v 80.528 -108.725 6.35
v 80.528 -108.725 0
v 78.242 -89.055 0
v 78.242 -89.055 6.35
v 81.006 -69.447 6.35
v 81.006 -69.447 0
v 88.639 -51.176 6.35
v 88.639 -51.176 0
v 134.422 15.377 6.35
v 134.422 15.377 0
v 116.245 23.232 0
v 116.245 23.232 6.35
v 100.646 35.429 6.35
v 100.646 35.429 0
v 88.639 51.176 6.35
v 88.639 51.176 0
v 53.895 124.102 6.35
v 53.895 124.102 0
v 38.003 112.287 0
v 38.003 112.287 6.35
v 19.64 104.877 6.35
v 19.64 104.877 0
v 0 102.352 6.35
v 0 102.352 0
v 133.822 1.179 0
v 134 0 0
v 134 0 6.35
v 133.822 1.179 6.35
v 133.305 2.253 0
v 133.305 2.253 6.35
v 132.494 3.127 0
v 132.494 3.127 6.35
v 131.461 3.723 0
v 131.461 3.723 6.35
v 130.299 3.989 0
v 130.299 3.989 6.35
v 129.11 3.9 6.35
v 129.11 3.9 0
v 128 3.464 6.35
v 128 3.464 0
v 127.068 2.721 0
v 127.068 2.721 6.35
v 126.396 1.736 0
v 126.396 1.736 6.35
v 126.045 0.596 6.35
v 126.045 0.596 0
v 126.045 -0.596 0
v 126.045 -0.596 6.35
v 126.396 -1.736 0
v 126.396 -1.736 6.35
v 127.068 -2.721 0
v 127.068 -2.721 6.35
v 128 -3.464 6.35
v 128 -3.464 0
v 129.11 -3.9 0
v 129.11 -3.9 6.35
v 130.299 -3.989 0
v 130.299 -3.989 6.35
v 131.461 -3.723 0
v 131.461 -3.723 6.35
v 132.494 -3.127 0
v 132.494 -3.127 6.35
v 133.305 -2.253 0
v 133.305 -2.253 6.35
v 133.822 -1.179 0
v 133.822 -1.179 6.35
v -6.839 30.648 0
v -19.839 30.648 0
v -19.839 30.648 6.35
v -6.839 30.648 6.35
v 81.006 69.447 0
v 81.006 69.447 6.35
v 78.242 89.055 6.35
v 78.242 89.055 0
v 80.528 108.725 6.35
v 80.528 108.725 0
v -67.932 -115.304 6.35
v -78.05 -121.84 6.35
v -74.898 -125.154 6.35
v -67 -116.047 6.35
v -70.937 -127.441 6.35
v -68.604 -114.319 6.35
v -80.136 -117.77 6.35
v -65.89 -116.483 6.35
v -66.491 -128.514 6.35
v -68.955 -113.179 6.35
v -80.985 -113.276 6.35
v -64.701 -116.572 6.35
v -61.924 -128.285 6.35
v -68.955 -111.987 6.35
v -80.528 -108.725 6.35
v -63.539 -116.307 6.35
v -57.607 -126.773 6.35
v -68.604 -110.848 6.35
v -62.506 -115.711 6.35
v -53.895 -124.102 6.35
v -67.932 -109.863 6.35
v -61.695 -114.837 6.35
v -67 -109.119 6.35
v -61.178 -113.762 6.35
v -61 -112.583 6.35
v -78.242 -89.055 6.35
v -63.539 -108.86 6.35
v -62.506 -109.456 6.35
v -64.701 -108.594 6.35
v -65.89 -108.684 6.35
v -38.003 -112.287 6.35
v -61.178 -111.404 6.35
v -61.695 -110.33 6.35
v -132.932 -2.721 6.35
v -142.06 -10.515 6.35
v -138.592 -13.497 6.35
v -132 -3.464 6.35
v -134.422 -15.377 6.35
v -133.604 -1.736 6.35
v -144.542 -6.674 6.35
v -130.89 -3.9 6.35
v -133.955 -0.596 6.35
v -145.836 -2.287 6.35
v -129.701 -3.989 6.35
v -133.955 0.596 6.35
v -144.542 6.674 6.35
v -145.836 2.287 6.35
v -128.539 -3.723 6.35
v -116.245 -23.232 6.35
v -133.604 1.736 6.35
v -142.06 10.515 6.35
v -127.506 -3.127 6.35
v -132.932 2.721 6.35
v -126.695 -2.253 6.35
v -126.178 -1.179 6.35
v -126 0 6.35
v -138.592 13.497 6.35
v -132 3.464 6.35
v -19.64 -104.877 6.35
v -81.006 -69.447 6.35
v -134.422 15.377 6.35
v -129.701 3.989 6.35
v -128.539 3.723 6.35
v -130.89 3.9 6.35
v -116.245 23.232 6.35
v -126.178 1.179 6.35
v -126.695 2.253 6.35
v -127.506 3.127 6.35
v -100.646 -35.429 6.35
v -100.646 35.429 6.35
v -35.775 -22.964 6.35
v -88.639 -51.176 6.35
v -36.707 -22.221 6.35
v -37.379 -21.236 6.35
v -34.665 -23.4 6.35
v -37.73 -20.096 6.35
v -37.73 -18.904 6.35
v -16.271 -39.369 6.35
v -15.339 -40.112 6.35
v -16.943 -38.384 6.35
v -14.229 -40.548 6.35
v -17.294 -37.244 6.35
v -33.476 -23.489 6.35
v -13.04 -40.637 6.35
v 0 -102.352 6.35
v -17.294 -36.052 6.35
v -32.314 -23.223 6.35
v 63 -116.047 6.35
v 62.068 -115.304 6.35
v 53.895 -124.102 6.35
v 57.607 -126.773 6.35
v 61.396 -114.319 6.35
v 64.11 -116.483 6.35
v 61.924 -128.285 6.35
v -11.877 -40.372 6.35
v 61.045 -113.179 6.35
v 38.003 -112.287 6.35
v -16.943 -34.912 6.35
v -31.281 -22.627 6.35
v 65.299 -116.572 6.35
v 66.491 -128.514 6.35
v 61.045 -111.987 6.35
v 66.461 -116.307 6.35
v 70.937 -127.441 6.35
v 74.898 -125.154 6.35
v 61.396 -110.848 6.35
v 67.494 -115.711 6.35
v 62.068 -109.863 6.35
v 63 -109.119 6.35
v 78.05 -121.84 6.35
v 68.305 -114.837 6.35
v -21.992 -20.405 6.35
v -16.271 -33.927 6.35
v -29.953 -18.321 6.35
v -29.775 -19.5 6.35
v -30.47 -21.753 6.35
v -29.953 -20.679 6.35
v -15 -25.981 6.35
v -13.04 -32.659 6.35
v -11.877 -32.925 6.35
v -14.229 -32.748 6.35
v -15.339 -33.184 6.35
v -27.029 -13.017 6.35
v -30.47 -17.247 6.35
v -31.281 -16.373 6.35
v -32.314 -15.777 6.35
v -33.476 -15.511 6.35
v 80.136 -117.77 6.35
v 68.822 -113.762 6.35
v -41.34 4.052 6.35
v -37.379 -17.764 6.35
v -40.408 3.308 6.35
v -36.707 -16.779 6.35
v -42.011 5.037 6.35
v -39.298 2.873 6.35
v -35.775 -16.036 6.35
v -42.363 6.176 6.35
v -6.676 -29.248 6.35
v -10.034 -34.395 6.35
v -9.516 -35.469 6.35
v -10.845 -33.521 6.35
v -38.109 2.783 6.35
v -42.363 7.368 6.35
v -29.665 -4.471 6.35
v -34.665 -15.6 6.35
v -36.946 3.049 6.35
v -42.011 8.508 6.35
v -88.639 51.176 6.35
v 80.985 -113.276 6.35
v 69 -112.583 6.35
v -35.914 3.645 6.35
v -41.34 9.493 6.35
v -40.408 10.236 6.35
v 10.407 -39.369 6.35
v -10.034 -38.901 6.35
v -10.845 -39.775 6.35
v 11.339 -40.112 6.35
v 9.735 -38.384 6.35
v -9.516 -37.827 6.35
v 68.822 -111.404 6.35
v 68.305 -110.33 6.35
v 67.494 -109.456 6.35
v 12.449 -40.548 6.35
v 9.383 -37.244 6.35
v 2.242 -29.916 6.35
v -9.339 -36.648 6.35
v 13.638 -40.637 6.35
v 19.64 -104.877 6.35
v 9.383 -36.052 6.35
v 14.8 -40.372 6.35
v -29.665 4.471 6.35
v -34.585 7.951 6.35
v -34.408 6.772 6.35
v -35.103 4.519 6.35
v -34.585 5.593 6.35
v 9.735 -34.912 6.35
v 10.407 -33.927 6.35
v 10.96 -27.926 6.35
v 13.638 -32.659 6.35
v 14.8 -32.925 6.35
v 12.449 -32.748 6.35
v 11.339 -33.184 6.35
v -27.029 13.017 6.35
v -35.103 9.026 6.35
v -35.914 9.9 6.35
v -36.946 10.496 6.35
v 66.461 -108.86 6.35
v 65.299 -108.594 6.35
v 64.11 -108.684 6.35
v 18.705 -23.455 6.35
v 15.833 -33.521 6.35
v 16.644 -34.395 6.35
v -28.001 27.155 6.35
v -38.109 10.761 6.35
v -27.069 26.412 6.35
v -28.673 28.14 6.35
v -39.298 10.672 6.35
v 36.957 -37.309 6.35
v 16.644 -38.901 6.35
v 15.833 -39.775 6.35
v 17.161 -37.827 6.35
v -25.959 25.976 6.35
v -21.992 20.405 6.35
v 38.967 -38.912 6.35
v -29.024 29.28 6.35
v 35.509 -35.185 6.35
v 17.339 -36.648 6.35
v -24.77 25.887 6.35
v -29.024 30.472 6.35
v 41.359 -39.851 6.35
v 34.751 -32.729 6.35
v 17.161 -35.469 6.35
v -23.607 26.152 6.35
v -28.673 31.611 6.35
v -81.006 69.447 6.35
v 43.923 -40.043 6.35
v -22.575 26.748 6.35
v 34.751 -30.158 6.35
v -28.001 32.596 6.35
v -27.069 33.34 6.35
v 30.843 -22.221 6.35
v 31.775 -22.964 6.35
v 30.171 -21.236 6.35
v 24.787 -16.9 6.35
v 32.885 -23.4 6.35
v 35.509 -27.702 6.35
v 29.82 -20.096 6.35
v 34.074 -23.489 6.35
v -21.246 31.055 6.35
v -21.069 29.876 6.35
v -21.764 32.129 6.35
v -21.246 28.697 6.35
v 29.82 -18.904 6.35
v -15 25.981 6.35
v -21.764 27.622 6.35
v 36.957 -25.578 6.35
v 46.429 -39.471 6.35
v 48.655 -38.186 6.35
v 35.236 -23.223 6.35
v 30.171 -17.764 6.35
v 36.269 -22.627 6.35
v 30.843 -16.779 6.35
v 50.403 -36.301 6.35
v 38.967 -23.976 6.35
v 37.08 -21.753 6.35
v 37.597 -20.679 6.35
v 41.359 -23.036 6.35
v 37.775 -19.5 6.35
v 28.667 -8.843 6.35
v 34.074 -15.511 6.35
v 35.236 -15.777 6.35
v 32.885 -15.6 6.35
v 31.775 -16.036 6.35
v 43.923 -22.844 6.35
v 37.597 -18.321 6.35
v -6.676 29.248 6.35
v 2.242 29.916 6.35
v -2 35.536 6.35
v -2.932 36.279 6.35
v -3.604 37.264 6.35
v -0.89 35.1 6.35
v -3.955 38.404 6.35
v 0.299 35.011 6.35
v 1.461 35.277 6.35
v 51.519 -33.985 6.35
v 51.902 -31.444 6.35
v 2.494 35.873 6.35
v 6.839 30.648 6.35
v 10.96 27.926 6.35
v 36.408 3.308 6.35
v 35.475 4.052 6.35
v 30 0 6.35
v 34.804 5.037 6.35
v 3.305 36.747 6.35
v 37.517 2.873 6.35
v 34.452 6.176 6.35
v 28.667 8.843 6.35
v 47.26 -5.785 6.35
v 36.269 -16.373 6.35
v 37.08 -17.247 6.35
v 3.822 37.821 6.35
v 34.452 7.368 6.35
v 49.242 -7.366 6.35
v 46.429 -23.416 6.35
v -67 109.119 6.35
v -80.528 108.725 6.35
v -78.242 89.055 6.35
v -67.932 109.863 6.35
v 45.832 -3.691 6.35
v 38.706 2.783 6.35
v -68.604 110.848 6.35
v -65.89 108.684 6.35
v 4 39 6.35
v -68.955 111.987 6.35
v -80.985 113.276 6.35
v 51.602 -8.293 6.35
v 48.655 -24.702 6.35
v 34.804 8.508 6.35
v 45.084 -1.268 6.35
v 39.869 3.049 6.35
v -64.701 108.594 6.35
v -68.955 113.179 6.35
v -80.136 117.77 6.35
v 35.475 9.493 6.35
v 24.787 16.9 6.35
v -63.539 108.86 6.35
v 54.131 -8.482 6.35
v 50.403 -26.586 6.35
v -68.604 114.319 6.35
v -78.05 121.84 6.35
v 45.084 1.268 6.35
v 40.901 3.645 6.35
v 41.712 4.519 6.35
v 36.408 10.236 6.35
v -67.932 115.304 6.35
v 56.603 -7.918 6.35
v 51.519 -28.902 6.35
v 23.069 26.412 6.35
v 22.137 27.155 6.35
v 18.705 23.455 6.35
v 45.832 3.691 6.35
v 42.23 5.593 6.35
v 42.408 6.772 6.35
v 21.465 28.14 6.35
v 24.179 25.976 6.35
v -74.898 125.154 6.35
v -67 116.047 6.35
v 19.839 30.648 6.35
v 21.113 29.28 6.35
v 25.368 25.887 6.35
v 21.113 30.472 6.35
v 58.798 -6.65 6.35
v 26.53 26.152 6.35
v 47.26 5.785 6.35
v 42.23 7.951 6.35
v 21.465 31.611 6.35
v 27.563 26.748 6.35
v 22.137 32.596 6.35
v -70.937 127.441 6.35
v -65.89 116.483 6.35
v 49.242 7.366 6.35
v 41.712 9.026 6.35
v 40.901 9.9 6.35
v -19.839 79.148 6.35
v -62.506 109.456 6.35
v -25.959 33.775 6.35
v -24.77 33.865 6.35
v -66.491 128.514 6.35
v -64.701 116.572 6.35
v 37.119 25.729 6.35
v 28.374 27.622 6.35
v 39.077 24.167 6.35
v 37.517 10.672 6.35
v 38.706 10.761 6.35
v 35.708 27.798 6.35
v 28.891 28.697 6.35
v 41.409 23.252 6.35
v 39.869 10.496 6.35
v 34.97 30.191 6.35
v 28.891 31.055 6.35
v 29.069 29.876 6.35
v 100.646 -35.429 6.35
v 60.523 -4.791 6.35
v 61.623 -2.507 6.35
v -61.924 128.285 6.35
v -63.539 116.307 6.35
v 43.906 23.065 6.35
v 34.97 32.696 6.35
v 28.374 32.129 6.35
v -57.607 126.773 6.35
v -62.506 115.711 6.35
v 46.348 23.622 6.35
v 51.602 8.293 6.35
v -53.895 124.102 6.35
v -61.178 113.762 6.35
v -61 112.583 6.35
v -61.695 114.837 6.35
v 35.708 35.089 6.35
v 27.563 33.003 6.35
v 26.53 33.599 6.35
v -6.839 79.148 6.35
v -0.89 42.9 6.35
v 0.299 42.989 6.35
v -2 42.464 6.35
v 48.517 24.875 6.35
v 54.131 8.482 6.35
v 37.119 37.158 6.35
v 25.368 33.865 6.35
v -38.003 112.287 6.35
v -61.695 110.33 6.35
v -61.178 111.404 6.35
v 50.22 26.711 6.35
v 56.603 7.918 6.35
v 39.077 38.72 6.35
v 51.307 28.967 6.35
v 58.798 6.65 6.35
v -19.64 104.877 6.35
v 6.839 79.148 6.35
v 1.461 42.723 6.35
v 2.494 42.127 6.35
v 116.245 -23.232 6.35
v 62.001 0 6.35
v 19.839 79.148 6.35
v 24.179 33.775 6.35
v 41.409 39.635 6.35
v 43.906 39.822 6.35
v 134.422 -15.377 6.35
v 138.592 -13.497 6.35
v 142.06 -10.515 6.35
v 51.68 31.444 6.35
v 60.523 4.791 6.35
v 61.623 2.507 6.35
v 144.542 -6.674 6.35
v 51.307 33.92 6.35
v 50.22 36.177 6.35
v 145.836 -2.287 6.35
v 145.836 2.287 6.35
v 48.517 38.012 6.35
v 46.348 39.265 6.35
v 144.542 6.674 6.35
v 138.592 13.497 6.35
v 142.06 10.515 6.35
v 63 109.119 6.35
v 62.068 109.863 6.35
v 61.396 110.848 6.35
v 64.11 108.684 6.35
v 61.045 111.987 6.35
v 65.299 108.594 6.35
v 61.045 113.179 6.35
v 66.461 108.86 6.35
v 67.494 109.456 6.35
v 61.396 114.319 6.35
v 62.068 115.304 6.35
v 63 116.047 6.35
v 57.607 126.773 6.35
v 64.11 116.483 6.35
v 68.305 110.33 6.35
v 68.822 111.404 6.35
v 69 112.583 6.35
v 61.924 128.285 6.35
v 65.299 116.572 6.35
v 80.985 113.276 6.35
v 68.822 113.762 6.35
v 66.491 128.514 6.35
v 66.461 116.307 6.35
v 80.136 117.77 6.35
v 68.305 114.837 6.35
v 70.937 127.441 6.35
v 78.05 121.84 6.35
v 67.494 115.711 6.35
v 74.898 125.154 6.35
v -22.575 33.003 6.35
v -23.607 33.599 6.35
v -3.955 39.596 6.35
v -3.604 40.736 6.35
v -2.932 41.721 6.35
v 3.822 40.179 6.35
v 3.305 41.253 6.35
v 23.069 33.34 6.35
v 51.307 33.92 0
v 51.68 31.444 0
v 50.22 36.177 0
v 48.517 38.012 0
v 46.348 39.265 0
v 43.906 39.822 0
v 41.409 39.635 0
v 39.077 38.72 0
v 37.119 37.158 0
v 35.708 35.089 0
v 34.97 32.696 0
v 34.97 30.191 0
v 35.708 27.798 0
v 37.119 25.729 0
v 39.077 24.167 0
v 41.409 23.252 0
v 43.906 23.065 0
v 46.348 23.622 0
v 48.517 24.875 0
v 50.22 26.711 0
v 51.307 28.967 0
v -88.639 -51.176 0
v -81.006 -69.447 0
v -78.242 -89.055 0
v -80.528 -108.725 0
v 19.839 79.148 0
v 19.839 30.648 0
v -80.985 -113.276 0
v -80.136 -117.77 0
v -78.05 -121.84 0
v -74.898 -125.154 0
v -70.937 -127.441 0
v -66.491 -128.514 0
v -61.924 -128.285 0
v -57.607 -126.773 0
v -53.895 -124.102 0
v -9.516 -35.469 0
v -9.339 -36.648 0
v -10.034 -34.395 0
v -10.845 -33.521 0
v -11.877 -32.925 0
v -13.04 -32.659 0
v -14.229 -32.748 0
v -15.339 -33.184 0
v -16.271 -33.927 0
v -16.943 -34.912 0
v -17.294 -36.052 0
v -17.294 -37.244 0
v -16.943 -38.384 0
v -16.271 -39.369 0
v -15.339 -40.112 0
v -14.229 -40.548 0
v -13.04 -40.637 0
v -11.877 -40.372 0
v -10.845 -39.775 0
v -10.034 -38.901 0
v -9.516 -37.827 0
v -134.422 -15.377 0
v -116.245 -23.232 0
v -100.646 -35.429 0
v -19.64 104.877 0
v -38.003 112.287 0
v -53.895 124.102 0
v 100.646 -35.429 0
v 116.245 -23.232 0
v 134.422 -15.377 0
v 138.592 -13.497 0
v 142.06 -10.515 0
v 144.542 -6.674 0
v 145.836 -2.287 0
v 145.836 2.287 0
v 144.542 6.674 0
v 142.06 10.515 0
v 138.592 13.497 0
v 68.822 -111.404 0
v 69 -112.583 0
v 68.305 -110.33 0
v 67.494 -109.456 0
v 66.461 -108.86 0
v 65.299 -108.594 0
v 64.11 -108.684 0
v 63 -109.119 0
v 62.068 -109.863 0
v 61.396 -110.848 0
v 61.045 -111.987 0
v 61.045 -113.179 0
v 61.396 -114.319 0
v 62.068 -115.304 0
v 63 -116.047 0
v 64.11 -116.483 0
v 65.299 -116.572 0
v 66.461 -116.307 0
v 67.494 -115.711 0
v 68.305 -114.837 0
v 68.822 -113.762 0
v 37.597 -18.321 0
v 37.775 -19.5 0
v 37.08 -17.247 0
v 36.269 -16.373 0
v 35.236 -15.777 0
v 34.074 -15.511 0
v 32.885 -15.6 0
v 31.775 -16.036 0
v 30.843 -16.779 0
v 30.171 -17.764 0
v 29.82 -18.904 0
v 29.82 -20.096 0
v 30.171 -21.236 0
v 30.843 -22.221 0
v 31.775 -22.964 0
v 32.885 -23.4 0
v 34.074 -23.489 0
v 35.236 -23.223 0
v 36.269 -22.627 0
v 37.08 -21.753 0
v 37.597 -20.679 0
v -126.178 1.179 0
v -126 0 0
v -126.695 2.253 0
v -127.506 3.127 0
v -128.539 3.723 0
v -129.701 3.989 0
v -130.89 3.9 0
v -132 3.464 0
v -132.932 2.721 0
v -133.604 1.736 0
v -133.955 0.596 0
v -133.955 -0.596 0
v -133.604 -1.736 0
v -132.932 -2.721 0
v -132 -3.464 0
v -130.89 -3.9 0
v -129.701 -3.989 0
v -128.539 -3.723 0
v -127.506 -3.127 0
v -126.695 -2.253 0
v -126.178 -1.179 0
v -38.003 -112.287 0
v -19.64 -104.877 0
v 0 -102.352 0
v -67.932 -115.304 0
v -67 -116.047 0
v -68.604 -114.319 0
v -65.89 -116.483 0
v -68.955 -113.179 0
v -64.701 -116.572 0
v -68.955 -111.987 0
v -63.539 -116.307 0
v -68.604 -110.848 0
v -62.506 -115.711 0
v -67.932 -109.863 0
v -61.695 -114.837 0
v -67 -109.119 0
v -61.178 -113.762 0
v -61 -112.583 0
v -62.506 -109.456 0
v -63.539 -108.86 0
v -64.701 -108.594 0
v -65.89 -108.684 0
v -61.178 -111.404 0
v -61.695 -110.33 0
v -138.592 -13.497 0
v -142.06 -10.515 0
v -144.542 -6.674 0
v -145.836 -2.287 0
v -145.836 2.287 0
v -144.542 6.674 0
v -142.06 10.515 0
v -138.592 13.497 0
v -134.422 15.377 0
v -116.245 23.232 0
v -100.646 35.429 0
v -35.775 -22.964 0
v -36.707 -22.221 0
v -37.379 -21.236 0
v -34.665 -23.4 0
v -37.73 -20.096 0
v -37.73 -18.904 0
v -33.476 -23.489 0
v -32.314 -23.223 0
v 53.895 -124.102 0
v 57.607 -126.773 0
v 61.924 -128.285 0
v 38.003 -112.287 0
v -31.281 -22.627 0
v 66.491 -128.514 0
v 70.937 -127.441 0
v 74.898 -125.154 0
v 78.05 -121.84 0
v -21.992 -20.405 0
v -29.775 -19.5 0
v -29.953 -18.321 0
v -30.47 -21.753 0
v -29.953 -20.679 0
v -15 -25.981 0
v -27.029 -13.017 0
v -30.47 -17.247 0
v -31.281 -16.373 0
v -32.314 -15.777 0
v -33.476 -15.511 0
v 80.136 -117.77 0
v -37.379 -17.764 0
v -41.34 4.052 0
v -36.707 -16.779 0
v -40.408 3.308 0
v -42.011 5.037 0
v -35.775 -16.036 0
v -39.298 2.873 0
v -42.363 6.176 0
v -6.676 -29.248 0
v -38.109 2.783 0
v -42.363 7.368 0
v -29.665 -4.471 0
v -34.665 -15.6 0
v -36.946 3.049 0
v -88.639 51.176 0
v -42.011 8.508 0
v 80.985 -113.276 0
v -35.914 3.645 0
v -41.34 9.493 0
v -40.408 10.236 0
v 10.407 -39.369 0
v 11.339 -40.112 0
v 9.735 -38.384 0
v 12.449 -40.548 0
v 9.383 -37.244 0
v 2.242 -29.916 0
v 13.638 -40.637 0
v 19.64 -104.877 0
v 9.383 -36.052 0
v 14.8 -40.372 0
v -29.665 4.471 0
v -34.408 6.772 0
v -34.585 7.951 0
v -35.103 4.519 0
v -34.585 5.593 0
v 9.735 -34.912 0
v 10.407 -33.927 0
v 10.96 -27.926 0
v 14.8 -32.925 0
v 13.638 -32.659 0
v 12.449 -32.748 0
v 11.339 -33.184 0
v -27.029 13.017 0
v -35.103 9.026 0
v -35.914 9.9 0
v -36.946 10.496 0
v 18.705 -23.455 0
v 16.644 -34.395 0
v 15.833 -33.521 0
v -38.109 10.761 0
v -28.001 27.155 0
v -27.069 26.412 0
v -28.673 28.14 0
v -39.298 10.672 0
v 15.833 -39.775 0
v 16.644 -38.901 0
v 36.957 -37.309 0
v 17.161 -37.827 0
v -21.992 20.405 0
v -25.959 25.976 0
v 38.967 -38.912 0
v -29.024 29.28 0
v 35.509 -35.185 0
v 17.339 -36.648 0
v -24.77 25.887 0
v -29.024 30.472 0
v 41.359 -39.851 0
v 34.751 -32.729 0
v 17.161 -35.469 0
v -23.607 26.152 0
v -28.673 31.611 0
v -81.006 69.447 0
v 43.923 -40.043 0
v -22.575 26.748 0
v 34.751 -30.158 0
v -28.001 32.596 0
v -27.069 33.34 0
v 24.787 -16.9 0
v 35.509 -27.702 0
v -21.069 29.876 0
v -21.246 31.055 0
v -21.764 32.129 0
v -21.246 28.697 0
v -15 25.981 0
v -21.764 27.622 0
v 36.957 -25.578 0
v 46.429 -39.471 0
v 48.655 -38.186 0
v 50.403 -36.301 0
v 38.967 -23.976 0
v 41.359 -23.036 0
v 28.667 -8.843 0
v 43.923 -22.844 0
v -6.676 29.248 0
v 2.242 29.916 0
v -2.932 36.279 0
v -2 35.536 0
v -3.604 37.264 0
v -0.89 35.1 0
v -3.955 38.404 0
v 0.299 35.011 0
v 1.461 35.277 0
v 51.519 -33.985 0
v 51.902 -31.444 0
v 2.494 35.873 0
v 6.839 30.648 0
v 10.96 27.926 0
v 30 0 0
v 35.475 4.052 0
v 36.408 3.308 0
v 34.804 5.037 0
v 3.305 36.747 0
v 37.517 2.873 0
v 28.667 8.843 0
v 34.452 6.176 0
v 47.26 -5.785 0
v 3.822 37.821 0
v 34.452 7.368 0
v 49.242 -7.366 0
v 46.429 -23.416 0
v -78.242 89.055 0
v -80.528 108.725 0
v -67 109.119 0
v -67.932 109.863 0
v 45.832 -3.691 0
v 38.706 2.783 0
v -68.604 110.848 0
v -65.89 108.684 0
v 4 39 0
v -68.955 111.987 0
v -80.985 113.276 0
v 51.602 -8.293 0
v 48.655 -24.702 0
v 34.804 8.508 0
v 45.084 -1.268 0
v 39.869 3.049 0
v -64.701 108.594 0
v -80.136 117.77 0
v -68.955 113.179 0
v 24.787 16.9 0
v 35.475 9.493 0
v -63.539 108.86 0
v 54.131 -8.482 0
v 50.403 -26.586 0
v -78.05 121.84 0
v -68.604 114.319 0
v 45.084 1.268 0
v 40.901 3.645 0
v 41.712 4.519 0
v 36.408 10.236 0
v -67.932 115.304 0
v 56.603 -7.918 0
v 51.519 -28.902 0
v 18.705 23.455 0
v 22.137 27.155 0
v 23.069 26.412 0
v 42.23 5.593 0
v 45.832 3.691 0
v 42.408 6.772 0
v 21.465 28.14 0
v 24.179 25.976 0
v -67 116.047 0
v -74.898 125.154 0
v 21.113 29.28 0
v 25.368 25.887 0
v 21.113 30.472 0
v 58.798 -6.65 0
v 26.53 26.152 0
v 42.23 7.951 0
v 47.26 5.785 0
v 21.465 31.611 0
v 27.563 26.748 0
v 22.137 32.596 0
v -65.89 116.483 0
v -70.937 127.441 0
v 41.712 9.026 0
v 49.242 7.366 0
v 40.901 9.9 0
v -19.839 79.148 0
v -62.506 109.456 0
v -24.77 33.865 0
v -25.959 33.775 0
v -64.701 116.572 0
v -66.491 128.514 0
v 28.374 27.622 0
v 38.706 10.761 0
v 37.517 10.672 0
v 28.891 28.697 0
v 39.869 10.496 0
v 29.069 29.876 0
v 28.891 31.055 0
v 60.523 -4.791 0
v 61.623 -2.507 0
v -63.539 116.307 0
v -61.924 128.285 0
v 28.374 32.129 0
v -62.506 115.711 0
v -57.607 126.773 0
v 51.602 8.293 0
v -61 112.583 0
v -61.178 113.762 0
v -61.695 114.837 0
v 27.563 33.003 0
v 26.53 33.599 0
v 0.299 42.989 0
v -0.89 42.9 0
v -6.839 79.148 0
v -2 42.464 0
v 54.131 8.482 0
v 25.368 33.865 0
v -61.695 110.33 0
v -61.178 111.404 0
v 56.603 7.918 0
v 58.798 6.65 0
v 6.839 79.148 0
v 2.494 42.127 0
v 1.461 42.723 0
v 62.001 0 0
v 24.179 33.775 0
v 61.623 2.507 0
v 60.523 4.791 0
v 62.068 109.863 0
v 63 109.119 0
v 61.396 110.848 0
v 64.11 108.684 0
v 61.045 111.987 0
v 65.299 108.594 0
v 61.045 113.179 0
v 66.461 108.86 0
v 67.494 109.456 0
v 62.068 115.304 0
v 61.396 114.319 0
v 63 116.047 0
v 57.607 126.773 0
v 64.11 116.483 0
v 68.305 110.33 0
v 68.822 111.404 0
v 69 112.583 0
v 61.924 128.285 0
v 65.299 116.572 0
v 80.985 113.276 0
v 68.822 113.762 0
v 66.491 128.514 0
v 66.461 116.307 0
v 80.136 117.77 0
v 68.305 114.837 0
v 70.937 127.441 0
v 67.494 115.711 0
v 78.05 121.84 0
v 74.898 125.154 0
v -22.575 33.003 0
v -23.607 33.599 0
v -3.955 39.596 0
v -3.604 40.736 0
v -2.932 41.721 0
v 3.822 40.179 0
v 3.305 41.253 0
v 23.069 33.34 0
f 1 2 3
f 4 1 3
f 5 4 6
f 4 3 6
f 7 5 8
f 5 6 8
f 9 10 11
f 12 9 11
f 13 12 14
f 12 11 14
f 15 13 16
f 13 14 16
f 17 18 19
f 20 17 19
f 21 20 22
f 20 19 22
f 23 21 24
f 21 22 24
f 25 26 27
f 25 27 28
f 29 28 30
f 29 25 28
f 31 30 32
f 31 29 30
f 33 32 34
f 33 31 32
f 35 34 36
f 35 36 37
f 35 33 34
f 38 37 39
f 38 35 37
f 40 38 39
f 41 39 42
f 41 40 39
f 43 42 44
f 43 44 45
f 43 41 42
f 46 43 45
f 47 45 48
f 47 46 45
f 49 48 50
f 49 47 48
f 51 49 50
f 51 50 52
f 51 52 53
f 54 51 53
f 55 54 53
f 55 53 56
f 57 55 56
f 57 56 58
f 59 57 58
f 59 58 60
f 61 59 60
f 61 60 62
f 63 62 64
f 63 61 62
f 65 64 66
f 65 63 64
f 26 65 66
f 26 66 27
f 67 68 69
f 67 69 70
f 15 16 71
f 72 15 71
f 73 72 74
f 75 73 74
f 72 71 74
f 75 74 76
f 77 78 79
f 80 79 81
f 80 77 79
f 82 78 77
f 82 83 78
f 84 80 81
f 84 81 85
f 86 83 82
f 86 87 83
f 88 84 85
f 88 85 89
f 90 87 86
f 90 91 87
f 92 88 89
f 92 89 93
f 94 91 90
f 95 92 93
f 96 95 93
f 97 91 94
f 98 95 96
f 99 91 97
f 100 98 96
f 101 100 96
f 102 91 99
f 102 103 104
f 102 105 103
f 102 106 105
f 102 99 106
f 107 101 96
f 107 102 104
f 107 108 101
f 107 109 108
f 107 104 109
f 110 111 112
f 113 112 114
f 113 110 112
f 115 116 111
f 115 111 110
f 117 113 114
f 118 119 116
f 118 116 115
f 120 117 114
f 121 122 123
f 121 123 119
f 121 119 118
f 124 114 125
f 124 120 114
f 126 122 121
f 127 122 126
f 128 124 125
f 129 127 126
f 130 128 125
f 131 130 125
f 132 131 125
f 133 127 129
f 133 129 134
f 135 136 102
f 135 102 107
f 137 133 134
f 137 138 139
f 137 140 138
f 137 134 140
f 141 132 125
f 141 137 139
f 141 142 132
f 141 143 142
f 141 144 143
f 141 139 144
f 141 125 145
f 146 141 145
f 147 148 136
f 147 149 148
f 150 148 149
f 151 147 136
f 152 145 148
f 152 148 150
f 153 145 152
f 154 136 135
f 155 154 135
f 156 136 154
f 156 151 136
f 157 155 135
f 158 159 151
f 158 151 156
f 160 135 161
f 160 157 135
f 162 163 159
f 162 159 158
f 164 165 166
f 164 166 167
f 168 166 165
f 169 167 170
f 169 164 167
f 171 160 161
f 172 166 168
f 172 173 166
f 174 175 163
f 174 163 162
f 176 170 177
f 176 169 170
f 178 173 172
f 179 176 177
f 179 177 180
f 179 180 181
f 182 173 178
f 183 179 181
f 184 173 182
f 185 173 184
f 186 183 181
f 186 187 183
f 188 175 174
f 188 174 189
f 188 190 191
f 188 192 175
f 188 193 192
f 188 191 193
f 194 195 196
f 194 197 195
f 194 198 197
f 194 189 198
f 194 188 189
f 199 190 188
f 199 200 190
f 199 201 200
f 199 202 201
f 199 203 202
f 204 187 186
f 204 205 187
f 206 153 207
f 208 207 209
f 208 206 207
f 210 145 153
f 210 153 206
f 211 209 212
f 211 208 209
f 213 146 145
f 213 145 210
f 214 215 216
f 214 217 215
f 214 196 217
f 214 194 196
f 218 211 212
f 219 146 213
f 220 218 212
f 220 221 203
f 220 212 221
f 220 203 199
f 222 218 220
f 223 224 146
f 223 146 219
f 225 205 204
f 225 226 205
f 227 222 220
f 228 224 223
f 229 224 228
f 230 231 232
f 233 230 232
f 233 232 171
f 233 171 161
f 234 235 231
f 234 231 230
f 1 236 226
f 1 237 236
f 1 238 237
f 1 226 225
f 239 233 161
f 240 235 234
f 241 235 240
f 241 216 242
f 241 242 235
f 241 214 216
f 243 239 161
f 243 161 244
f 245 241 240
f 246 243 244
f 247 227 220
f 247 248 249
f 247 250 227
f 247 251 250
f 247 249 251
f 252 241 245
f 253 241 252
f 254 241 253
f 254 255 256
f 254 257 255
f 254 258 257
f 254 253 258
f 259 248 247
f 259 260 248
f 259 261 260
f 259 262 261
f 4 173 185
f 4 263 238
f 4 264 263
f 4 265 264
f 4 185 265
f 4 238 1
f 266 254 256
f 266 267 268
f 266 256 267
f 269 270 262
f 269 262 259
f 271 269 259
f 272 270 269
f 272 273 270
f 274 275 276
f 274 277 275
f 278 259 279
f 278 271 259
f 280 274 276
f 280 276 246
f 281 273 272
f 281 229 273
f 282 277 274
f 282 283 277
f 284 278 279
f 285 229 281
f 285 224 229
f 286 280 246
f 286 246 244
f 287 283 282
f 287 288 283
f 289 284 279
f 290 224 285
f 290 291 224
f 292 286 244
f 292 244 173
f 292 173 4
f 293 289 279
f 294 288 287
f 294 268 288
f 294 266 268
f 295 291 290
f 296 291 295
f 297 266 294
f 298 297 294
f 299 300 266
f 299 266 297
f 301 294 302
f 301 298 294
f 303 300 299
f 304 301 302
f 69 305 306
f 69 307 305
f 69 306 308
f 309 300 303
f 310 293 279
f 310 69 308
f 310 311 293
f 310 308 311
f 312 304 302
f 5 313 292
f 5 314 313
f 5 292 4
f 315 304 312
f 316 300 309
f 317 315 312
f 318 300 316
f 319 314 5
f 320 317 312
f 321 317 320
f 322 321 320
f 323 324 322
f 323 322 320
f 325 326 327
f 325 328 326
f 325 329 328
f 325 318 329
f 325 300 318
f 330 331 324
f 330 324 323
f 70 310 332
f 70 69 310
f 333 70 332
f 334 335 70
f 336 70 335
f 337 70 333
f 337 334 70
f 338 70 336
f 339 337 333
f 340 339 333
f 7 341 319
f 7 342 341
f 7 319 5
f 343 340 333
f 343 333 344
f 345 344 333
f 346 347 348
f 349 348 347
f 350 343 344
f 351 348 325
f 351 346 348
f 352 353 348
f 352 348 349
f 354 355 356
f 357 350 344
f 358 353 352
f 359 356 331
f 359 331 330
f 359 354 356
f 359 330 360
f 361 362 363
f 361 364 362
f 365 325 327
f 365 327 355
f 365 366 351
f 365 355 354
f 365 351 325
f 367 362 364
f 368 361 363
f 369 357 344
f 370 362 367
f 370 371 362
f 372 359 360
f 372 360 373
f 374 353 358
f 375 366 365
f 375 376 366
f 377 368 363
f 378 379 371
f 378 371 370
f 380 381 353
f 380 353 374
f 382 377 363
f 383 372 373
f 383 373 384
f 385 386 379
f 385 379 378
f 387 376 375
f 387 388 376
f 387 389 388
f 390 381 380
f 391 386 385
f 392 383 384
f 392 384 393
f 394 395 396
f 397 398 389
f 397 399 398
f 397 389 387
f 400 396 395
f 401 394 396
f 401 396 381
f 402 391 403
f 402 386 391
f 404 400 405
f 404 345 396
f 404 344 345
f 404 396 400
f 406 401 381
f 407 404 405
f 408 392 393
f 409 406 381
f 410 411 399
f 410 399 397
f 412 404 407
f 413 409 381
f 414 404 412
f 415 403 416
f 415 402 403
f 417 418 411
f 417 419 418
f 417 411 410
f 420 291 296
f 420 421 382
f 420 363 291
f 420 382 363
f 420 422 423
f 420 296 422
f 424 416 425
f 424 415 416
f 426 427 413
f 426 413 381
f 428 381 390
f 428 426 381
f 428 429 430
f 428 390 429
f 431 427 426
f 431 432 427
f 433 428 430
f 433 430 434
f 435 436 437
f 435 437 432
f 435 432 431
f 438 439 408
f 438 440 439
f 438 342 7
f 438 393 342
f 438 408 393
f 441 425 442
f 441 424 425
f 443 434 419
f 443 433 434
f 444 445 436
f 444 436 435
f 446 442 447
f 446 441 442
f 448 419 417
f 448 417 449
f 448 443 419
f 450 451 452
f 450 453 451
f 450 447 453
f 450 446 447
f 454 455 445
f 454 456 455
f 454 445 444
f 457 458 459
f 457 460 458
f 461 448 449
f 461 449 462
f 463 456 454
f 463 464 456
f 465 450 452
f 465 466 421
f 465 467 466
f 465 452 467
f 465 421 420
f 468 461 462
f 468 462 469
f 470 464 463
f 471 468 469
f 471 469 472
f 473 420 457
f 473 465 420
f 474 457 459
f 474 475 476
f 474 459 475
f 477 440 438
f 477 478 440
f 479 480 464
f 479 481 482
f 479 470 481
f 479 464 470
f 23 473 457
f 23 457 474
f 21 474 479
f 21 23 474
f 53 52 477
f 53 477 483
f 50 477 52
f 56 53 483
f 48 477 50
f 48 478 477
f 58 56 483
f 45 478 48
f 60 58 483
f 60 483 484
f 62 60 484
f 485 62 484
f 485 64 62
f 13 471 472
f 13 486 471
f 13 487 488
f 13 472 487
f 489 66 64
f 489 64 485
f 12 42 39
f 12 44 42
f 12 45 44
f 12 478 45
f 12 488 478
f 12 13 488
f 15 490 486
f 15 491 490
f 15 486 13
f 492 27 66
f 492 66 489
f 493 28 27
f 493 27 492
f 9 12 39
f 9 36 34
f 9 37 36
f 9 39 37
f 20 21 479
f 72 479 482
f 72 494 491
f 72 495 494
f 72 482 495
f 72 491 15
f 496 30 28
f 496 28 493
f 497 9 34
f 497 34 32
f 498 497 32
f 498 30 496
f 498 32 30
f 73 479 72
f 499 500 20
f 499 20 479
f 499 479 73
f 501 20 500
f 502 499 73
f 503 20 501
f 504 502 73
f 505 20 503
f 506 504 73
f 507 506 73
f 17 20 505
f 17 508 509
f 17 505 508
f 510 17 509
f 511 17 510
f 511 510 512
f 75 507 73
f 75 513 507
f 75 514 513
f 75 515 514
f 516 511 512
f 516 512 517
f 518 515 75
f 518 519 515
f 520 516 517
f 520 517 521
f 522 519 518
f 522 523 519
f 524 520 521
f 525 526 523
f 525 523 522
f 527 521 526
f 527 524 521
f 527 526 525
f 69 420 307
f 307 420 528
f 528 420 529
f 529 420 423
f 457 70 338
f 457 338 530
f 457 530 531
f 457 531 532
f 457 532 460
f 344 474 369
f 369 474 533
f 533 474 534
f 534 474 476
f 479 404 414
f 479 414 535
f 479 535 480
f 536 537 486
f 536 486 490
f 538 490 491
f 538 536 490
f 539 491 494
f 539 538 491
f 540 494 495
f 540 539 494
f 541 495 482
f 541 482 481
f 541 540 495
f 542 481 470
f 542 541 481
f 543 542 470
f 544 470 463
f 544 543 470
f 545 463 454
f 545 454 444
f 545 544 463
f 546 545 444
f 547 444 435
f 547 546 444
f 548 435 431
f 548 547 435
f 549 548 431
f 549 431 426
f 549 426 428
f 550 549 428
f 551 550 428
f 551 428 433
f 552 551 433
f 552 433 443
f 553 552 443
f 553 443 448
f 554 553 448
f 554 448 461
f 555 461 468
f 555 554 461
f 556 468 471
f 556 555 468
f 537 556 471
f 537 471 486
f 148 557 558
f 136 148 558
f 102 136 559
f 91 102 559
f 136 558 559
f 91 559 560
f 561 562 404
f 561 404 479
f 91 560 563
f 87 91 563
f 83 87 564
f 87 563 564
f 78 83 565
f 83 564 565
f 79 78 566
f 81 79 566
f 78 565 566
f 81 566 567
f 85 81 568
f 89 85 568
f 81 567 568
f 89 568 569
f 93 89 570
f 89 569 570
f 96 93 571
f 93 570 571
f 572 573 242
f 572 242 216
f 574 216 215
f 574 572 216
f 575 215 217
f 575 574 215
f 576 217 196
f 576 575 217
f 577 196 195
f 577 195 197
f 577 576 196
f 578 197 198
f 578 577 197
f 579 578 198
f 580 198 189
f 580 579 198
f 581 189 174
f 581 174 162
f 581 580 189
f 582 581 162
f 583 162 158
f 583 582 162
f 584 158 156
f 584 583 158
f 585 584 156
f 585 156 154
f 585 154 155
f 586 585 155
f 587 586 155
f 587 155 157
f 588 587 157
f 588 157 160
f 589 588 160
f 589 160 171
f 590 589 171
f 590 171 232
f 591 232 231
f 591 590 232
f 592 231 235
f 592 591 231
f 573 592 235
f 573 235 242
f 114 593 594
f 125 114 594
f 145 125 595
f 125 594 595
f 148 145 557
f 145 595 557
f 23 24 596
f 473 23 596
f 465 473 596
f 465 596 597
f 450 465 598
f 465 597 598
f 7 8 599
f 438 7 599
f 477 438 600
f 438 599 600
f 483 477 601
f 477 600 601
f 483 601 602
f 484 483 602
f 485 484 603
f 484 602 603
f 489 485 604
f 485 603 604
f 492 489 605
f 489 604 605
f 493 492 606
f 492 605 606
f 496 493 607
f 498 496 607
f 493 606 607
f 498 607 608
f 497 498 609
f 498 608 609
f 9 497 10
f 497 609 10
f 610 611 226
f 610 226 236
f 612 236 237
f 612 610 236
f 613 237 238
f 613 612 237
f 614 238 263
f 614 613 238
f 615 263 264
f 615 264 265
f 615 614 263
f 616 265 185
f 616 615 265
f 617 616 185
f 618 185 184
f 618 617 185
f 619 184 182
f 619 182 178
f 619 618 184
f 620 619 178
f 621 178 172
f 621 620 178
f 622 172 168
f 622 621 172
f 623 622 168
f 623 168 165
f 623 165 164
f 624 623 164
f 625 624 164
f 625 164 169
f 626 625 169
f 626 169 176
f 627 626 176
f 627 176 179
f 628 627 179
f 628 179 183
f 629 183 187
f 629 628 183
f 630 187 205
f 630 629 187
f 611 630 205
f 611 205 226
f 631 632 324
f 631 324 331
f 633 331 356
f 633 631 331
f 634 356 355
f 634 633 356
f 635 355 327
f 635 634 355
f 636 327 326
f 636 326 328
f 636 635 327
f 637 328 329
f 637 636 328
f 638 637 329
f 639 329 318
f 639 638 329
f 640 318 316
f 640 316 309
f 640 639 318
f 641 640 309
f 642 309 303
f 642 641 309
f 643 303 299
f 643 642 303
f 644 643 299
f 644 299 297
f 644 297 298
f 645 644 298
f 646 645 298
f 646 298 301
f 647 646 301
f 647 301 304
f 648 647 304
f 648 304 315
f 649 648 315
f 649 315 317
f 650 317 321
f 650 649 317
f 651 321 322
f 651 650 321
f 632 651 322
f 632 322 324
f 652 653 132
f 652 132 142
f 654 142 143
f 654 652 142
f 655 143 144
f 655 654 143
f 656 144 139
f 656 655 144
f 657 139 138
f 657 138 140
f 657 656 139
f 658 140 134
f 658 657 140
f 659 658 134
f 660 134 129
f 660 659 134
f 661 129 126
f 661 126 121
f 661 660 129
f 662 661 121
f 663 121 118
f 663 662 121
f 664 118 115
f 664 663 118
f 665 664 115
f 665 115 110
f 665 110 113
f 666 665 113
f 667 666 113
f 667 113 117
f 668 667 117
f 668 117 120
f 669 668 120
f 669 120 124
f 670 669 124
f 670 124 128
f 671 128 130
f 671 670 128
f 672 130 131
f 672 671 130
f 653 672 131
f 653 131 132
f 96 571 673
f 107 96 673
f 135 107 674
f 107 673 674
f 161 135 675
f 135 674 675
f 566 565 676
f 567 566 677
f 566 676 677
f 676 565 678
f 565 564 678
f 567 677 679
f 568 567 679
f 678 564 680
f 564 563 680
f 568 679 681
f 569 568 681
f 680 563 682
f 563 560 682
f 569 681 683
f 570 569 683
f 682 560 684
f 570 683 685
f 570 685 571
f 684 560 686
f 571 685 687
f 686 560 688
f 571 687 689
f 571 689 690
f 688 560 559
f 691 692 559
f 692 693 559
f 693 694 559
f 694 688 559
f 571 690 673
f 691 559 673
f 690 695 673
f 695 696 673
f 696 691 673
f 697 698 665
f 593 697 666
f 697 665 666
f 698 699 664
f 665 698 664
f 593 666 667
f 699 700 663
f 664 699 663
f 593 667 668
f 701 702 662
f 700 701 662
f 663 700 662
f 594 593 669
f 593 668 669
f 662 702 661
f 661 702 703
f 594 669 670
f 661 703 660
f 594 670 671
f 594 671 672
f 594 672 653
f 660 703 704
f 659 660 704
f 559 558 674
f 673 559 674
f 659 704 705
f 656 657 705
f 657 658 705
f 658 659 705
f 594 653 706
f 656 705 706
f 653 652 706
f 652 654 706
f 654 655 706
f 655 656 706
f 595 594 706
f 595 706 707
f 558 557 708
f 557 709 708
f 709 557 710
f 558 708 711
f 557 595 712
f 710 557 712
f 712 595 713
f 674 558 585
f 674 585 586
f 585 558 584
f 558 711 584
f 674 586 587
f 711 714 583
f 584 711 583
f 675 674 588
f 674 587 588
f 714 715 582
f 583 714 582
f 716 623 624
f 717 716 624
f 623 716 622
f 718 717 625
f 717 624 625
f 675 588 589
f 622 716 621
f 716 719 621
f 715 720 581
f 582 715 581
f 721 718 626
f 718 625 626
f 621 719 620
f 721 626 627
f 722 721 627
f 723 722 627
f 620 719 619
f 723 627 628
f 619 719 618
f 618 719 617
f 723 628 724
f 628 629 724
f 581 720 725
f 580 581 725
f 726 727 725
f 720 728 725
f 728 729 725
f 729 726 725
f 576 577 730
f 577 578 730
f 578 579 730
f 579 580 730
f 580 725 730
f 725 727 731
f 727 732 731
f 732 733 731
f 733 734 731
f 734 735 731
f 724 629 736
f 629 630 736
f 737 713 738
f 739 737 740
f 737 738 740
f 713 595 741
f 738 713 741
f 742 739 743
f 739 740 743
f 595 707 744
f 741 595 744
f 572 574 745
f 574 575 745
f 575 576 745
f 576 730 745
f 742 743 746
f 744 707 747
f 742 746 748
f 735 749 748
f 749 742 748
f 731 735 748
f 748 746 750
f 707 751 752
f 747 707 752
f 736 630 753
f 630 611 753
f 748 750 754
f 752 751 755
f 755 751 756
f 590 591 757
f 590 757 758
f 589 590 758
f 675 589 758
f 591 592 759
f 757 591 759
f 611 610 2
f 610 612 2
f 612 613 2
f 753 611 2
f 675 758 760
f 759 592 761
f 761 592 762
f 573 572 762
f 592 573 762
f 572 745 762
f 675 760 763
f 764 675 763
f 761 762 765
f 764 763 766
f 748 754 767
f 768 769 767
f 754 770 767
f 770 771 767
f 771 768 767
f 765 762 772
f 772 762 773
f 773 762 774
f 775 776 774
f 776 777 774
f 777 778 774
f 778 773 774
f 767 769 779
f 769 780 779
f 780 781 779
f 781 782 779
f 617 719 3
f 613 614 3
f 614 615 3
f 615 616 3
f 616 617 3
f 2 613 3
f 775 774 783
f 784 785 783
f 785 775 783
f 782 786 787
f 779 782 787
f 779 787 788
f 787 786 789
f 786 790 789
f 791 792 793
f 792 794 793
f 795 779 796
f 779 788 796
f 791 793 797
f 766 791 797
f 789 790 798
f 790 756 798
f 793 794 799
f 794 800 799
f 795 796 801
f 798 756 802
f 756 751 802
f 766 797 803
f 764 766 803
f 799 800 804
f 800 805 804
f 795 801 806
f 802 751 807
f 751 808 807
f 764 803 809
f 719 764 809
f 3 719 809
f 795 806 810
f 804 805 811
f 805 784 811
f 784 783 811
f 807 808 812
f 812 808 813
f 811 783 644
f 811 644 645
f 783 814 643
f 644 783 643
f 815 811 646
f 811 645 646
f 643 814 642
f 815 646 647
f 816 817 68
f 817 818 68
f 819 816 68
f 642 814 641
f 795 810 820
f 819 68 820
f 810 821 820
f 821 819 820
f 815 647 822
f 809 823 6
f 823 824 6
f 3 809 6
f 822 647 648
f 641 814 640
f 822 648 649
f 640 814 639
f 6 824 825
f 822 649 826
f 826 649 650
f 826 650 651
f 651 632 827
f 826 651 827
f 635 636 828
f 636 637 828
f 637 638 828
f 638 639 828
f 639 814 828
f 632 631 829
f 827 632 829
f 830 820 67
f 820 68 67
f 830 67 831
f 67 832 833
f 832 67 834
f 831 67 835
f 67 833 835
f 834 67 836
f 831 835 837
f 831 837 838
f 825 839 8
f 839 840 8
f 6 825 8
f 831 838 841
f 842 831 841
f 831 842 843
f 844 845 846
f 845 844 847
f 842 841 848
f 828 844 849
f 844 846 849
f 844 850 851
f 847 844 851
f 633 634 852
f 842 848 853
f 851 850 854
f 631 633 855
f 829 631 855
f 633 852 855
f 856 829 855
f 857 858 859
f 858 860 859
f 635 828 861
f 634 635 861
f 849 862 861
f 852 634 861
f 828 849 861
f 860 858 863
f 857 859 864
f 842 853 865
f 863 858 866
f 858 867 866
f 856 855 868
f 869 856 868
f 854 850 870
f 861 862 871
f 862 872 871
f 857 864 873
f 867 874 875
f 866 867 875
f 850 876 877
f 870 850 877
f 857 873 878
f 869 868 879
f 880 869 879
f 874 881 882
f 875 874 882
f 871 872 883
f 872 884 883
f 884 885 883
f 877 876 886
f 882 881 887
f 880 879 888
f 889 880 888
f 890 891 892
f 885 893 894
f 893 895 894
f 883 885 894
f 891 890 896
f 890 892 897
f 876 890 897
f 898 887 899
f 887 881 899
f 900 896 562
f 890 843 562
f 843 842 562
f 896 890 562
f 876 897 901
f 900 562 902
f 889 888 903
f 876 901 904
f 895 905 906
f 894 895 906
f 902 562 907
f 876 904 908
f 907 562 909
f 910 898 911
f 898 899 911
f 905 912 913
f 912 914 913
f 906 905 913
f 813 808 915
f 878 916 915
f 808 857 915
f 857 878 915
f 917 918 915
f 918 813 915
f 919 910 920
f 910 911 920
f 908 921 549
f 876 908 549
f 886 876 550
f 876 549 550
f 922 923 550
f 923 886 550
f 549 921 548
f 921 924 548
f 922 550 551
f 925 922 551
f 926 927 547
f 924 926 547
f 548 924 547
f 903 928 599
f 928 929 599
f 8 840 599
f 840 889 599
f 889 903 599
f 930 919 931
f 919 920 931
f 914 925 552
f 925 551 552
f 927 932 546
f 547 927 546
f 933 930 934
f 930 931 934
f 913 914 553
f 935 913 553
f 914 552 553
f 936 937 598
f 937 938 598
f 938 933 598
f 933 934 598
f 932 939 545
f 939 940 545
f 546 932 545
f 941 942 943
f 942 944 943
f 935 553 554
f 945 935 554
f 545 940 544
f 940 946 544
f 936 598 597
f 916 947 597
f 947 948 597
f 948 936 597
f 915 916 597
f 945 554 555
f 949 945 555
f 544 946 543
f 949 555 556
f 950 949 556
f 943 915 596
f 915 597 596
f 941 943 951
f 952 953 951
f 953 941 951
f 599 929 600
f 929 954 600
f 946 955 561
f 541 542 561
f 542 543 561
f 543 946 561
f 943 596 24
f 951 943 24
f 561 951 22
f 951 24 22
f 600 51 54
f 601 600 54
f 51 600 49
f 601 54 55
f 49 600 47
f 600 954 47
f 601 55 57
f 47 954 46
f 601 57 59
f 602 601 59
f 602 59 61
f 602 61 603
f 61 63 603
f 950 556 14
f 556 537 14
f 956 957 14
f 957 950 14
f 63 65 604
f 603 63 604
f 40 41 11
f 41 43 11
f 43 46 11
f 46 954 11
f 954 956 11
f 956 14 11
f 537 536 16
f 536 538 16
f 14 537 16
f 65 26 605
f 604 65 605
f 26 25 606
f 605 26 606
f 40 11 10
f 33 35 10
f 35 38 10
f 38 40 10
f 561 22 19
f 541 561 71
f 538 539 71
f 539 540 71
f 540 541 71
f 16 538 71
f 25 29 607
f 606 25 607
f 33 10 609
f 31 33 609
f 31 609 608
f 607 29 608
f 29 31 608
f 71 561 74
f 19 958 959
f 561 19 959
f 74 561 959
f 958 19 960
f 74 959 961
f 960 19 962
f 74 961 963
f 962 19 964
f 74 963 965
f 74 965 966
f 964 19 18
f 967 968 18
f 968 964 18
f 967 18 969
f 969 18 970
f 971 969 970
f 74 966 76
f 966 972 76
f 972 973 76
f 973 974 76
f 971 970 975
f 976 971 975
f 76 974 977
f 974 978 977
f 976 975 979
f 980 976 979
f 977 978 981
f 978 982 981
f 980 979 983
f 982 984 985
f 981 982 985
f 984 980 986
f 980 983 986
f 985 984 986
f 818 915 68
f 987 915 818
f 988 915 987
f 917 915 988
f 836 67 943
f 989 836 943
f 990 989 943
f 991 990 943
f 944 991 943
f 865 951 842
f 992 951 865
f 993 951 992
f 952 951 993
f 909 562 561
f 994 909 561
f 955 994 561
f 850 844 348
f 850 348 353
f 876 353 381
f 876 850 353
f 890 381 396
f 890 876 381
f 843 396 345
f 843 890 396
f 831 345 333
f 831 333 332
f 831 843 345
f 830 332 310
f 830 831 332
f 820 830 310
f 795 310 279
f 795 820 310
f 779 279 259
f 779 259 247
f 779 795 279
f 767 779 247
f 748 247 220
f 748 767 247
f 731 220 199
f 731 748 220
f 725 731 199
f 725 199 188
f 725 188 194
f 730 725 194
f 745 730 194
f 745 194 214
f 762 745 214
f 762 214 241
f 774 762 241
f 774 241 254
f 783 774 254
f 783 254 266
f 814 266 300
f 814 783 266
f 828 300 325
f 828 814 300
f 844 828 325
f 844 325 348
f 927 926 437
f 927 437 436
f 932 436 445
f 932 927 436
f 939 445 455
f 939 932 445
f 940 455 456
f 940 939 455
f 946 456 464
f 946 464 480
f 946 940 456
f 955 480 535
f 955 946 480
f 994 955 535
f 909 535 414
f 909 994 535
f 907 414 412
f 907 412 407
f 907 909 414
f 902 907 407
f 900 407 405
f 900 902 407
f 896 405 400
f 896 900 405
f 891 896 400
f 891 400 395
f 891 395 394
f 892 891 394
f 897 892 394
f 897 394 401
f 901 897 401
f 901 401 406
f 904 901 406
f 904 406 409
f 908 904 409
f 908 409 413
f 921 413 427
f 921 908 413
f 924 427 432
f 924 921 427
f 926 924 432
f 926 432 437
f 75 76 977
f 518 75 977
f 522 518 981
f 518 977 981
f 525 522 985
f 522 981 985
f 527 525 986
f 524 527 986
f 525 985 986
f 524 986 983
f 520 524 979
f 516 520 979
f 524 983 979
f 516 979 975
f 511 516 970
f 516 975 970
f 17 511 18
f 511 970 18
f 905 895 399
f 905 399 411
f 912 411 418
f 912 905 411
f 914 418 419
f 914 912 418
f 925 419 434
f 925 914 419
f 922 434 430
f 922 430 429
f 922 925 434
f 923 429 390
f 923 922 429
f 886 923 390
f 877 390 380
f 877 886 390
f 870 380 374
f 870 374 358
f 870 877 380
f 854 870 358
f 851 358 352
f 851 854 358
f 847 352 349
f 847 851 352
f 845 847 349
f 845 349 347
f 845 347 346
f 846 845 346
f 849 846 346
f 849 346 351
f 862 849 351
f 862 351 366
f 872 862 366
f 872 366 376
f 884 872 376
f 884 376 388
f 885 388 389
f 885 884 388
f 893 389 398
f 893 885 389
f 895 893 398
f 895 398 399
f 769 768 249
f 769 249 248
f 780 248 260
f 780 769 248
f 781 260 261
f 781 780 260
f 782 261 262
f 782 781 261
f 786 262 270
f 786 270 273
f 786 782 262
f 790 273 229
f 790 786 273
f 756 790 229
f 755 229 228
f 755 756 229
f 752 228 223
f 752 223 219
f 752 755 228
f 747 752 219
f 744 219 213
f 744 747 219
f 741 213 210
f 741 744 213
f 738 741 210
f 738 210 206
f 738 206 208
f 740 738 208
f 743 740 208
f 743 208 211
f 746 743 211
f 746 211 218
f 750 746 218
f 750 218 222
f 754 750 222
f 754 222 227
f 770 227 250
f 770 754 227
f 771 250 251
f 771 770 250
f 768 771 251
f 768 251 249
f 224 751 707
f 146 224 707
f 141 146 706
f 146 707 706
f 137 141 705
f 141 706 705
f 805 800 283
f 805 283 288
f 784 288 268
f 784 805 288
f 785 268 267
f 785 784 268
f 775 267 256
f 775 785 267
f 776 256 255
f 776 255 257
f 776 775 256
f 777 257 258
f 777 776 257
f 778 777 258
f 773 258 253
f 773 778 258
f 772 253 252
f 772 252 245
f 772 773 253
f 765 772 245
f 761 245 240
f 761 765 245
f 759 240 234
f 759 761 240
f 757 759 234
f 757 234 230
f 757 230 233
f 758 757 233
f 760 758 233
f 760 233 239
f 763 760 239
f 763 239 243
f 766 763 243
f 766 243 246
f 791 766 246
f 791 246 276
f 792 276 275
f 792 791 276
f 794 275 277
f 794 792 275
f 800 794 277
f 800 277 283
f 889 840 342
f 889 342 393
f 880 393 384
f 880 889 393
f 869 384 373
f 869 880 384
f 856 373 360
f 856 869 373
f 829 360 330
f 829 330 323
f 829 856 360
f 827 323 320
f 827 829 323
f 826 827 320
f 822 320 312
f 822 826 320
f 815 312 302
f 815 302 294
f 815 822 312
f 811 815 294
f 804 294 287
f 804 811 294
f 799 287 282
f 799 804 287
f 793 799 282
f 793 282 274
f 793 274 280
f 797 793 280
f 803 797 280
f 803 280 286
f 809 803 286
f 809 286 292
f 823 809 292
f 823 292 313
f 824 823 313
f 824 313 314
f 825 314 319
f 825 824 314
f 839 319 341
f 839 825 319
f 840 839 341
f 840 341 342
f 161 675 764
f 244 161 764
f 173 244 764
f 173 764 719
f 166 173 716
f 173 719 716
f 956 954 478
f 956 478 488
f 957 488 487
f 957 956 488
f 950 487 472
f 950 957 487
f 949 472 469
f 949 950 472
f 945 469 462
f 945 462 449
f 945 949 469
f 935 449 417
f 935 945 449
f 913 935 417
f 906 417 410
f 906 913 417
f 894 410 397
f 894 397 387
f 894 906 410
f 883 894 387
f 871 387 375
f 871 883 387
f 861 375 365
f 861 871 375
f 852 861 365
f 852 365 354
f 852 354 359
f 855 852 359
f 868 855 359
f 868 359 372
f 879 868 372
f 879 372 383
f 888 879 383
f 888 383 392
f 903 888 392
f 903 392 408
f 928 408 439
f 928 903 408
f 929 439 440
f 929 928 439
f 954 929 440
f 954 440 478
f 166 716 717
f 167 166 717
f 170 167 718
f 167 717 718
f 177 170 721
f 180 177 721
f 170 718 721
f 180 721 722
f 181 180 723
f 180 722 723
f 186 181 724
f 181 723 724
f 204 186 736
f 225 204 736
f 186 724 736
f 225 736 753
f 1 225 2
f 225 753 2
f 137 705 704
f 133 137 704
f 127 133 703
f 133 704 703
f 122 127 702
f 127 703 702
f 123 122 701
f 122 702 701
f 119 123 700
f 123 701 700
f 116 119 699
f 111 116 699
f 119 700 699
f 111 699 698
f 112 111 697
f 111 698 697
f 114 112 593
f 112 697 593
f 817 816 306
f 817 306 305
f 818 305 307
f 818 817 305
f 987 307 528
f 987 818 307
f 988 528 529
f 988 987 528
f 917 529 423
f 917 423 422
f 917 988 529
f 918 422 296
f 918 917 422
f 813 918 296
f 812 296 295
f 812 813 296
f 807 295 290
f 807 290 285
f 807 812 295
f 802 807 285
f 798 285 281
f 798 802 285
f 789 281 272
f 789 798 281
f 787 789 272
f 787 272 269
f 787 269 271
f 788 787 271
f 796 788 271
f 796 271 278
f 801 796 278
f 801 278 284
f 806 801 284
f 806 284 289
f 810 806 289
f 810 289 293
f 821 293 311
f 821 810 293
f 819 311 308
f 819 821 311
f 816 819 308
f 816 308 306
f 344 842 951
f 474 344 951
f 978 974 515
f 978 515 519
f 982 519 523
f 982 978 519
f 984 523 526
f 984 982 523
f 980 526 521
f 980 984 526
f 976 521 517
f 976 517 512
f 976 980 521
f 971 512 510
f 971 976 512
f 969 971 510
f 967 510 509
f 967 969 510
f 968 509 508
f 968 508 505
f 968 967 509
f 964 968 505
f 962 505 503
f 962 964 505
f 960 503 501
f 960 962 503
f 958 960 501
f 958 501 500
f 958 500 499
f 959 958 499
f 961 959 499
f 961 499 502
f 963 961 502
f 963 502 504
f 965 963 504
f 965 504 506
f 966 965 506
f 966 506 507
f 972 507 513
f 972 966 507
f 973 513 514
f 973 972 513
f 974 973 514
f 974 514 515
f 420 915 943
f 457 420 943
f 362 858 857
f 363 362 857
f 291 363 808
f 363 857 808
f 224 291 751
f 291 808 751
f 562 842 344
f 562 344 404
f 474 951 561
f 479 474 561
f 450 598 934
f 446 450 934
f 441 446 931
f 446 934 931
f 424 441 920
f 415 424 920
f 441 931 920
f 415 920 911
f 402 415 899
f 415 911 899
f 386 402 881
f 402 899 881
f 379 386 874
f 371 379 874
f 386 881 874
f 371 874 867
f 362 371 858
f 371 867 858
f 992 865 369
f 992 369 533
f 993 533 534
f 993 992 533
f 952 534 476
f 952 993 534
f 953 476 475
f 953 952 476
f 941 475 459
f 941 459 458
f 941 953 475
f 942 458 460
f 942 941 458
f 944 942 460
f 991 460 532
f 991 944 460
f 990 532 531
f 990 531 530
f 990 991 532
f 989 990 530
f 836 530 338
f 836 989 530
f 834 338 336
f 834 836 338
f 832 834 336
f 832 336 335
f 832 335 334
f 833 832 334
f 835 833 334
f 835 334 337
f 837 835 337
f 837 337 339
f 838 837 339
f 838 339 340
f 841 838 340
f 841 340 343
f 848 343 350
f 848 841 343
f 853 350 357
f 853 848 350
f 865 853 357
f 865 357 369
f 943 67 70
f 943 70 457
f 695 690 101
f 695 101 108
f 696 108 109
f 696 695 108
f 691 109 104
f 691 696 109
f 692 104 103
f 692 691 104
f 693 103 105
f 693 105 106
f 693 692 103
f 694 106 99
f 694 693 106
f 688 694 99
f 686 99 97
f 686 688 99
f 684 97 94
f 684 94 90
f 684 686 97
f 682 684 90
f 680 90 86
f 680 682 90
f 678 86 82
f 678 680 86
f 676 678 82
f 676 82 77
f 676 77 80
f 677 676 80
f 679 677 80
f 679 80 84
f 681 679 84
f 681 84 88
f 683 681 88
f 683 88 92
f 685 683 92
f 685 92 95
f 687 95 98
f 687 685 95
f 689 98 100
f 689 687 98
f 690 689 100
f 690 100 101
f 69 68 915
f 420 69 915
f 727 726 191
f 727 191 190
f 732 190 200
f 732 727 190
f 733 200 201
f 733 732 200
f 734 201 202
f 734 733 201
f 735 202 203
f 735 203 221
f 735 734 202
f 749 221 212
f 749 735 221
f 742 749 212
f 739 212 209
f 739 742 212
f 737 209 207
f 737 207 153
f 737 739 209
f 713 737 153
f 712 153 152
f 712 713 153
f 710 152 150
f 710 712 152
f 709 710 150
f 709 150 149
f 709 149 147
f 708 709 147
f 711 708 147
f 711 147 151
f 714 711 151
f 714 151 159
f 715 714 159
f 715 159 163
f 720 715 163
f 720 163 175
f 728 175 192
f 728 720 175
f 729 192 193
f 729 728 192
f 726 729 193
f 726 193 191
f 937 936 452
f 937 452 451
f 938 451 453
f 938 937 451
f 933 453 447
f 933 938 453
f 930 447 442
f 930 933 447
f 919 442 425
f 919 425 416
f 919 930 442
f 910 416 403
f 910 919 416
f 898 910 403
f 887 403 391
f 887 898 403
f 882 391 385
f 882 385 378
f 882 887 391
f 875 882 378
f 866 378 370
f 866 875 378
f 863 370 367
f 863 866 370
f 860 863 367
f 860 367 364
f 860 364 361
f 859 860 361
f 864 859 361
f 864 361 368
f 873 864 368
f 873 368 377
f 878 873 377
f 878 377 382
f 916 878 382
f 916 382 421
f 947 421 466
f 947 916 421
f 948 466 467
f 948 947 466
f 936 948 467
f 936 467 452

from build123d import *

# Parameters (mm, degrees)
SKETCH2_R           = 4
SKETCH2_R_2         = 30
SKETCH2_R_3         = 8.623329564
SKETCH2_R_4         = 8.505813098
SKETCH2_R_5         = 8.401963559
SKETCH2_W           = 13
SKETCH2_H           = 48.5
BOSS_EXTRUDE1_DEPTH = 6.35


with BuildPart() as part:
    # Sketch2 → Boss-Extrude1 (new body)
    with BuildSketch(Plane.XY):
        with BuildLine():
            ThreePointArc((80.527805435, 108.72490148), (73, 126.439708953), (53.894623988, 124.101575958))
            ThreePointArc((53.894623988, 124.101575958), (29.058945383, 107.994153026), (0, 102.351662573))
            ThreePointArc((0, 102.351662573), (-29.058945383, 107.994153026), (-53.894623988, 124.101575958))
            ThreePointArc((-53.894623988, 124.101575958), (-73, 126.439708953), (-80.527805435, 108.72490148))
            ThreePointArc((-80.527805435, 108.72490148), (-78.996207289, 79.162861422), (-88.639139908, 51.175831286))
            ThreePointArc((-88.639139908, 51.175831286), (-108.055152672, 28.831291604), (-134.422429423, 15.376674478))
            ThreePointArc((-134.422429423, 15.376674478), (-146, 0), (-134.422429423, -15.376674478))
            ThreePointArc((-134.422429423, -15.376674478), (-108.055152672, -28.831291604), (-88.639139908, -51.175831286))
            ThreePointArc((-88.639139908, -51.175831286), (-78.996207289, -79.162861422), (-80.527805435, -108.72490148))
            ThreePointArc((-80.527805435, -108.72490148), (-73, -126.439708953), (-53.894623988, -124.101575958))
            ThreePointArc((-53.894623988, -124.101575958), (-29.058945383, -107.994153026), (0, -102.351662573))
            ThreePointArc((0, -102.351662573), (29.058945383, -107.994153026), (53.894623988, -124.101575958))
            ThreePointArc((53.894623988, -124.101575958), (73, -126.439708953), (80.527805435, -108.72490148))
            ThreePointArc((80.527805435, -108.72490148), (78.996207289, -79.162861422), (88.639139908, -51.175831286))
            ThreePointArc((88.639139908, -51.175831286), (108.055152672, -28.831291604), (134.422429423, -15.376674478))
            ThreePointArc((134.422429423, -15.376674478), (146, 0), (134.422429423, 15.376674478))
            ThreePointArc((134.422429423, 15.376674478), (108.055152672, 28.831291604), (88.639139908, 51.175831286))
            ThreePointArc((88.639139908, 51.175831286), (78.996207289, 79.162861422), (80.527805435, 108.72490148))
        make_face()
        with Locations((65, 112.583302492)):
            Circle(SKETCH2_R, mode=Mode.SUBTRACT)
        with Locations((130, 0)):
            Circle(SKETCH2_R, mode=Mode.SUBTRACT)
        with Locations((65, -112.583302492)):
            Circle(SKETCH2_R, mode=Mode.SUBTRACT)
        with Locations((-65, -112.583302492)):
            Circle(SKETCH2_R, mode=Mode.SUBTRACT)
        with Locations((-130, 0)):
            Circle(SKETCH2_R, mode=Mode.SUBTRACT)
        with Locations((-65, 112.583302492)):
            Circle(SKETCH2_R, mode=Mode.SUBTRACT)
        with Locations((25.068716778, 29.875733282)):
            Circle(SKETCH2_R, mode=Mode.SUBTRACT)
        with Locations((38.407502367, 6.772278929)):
            Circle(SKETCH2_R, mode=Mode.SUBTRACT)
        with Locations((33.774990748, -19.5)):
            Circle(SKETCH2_R, mode=Mode.SUBTRACT)
        with Locations((13.33878559, -36.648012211)):
            Circle(SKETCH2_R, mode=Mode.SUBTRACT)
        with Locations((-13.33878559, -36.648012211)):
            Circle(SKETCH2_R, mode=Mode.SUBTRACT)
        with Locations((-33.774990748, -19.5)):
            Circle(SKETCH2_R, mode=Mode.SUBTRACT)
        with Locations((-38.407502367, 6.772278929)):
            Circle(SKETCH2_R, mode=Mode.SUBTRACT)
        with Locations((-25.068716778, 29.875733282)):
            Circle(SKETCH2_R, mode=Mode.SUBTRACT)
        Circle(SKETCH2_R_2, mode=Mode.SUBTRACT)
        with Locations((43.278364114, -31.443572071)):
            Circle(SKETCH2_R_3, mode=Mode.SUBTRACT)
        with Locations((53.495, 0)):
            Circle(SKETCH2_R_4, mode=Mode.SUBTRACT)
        with Locations((43.278364114, 31.443572071)):
            Circle(SKETCH2_R_5, mode=Mode.SUBTRACT)
        with Locations((0, 39)):
            Circle(SKETCH2_R, mode=Mode.SUBTRACT)
        with Locations((-13.33878559, 54.898012211)):
            Rectangle(SKETCH2_W, SKETCH2_H, mode=Mode.SUBTRACT)
        with Locations((13.33878559, 54.898012211)):
            Rectangle(SKETCH2_W, SKETCH2_H, mode=Mode.SUBTRACT)
    extrude(amount=BOSS_EXTRUDE1_DEPTH)


solid = part.part
